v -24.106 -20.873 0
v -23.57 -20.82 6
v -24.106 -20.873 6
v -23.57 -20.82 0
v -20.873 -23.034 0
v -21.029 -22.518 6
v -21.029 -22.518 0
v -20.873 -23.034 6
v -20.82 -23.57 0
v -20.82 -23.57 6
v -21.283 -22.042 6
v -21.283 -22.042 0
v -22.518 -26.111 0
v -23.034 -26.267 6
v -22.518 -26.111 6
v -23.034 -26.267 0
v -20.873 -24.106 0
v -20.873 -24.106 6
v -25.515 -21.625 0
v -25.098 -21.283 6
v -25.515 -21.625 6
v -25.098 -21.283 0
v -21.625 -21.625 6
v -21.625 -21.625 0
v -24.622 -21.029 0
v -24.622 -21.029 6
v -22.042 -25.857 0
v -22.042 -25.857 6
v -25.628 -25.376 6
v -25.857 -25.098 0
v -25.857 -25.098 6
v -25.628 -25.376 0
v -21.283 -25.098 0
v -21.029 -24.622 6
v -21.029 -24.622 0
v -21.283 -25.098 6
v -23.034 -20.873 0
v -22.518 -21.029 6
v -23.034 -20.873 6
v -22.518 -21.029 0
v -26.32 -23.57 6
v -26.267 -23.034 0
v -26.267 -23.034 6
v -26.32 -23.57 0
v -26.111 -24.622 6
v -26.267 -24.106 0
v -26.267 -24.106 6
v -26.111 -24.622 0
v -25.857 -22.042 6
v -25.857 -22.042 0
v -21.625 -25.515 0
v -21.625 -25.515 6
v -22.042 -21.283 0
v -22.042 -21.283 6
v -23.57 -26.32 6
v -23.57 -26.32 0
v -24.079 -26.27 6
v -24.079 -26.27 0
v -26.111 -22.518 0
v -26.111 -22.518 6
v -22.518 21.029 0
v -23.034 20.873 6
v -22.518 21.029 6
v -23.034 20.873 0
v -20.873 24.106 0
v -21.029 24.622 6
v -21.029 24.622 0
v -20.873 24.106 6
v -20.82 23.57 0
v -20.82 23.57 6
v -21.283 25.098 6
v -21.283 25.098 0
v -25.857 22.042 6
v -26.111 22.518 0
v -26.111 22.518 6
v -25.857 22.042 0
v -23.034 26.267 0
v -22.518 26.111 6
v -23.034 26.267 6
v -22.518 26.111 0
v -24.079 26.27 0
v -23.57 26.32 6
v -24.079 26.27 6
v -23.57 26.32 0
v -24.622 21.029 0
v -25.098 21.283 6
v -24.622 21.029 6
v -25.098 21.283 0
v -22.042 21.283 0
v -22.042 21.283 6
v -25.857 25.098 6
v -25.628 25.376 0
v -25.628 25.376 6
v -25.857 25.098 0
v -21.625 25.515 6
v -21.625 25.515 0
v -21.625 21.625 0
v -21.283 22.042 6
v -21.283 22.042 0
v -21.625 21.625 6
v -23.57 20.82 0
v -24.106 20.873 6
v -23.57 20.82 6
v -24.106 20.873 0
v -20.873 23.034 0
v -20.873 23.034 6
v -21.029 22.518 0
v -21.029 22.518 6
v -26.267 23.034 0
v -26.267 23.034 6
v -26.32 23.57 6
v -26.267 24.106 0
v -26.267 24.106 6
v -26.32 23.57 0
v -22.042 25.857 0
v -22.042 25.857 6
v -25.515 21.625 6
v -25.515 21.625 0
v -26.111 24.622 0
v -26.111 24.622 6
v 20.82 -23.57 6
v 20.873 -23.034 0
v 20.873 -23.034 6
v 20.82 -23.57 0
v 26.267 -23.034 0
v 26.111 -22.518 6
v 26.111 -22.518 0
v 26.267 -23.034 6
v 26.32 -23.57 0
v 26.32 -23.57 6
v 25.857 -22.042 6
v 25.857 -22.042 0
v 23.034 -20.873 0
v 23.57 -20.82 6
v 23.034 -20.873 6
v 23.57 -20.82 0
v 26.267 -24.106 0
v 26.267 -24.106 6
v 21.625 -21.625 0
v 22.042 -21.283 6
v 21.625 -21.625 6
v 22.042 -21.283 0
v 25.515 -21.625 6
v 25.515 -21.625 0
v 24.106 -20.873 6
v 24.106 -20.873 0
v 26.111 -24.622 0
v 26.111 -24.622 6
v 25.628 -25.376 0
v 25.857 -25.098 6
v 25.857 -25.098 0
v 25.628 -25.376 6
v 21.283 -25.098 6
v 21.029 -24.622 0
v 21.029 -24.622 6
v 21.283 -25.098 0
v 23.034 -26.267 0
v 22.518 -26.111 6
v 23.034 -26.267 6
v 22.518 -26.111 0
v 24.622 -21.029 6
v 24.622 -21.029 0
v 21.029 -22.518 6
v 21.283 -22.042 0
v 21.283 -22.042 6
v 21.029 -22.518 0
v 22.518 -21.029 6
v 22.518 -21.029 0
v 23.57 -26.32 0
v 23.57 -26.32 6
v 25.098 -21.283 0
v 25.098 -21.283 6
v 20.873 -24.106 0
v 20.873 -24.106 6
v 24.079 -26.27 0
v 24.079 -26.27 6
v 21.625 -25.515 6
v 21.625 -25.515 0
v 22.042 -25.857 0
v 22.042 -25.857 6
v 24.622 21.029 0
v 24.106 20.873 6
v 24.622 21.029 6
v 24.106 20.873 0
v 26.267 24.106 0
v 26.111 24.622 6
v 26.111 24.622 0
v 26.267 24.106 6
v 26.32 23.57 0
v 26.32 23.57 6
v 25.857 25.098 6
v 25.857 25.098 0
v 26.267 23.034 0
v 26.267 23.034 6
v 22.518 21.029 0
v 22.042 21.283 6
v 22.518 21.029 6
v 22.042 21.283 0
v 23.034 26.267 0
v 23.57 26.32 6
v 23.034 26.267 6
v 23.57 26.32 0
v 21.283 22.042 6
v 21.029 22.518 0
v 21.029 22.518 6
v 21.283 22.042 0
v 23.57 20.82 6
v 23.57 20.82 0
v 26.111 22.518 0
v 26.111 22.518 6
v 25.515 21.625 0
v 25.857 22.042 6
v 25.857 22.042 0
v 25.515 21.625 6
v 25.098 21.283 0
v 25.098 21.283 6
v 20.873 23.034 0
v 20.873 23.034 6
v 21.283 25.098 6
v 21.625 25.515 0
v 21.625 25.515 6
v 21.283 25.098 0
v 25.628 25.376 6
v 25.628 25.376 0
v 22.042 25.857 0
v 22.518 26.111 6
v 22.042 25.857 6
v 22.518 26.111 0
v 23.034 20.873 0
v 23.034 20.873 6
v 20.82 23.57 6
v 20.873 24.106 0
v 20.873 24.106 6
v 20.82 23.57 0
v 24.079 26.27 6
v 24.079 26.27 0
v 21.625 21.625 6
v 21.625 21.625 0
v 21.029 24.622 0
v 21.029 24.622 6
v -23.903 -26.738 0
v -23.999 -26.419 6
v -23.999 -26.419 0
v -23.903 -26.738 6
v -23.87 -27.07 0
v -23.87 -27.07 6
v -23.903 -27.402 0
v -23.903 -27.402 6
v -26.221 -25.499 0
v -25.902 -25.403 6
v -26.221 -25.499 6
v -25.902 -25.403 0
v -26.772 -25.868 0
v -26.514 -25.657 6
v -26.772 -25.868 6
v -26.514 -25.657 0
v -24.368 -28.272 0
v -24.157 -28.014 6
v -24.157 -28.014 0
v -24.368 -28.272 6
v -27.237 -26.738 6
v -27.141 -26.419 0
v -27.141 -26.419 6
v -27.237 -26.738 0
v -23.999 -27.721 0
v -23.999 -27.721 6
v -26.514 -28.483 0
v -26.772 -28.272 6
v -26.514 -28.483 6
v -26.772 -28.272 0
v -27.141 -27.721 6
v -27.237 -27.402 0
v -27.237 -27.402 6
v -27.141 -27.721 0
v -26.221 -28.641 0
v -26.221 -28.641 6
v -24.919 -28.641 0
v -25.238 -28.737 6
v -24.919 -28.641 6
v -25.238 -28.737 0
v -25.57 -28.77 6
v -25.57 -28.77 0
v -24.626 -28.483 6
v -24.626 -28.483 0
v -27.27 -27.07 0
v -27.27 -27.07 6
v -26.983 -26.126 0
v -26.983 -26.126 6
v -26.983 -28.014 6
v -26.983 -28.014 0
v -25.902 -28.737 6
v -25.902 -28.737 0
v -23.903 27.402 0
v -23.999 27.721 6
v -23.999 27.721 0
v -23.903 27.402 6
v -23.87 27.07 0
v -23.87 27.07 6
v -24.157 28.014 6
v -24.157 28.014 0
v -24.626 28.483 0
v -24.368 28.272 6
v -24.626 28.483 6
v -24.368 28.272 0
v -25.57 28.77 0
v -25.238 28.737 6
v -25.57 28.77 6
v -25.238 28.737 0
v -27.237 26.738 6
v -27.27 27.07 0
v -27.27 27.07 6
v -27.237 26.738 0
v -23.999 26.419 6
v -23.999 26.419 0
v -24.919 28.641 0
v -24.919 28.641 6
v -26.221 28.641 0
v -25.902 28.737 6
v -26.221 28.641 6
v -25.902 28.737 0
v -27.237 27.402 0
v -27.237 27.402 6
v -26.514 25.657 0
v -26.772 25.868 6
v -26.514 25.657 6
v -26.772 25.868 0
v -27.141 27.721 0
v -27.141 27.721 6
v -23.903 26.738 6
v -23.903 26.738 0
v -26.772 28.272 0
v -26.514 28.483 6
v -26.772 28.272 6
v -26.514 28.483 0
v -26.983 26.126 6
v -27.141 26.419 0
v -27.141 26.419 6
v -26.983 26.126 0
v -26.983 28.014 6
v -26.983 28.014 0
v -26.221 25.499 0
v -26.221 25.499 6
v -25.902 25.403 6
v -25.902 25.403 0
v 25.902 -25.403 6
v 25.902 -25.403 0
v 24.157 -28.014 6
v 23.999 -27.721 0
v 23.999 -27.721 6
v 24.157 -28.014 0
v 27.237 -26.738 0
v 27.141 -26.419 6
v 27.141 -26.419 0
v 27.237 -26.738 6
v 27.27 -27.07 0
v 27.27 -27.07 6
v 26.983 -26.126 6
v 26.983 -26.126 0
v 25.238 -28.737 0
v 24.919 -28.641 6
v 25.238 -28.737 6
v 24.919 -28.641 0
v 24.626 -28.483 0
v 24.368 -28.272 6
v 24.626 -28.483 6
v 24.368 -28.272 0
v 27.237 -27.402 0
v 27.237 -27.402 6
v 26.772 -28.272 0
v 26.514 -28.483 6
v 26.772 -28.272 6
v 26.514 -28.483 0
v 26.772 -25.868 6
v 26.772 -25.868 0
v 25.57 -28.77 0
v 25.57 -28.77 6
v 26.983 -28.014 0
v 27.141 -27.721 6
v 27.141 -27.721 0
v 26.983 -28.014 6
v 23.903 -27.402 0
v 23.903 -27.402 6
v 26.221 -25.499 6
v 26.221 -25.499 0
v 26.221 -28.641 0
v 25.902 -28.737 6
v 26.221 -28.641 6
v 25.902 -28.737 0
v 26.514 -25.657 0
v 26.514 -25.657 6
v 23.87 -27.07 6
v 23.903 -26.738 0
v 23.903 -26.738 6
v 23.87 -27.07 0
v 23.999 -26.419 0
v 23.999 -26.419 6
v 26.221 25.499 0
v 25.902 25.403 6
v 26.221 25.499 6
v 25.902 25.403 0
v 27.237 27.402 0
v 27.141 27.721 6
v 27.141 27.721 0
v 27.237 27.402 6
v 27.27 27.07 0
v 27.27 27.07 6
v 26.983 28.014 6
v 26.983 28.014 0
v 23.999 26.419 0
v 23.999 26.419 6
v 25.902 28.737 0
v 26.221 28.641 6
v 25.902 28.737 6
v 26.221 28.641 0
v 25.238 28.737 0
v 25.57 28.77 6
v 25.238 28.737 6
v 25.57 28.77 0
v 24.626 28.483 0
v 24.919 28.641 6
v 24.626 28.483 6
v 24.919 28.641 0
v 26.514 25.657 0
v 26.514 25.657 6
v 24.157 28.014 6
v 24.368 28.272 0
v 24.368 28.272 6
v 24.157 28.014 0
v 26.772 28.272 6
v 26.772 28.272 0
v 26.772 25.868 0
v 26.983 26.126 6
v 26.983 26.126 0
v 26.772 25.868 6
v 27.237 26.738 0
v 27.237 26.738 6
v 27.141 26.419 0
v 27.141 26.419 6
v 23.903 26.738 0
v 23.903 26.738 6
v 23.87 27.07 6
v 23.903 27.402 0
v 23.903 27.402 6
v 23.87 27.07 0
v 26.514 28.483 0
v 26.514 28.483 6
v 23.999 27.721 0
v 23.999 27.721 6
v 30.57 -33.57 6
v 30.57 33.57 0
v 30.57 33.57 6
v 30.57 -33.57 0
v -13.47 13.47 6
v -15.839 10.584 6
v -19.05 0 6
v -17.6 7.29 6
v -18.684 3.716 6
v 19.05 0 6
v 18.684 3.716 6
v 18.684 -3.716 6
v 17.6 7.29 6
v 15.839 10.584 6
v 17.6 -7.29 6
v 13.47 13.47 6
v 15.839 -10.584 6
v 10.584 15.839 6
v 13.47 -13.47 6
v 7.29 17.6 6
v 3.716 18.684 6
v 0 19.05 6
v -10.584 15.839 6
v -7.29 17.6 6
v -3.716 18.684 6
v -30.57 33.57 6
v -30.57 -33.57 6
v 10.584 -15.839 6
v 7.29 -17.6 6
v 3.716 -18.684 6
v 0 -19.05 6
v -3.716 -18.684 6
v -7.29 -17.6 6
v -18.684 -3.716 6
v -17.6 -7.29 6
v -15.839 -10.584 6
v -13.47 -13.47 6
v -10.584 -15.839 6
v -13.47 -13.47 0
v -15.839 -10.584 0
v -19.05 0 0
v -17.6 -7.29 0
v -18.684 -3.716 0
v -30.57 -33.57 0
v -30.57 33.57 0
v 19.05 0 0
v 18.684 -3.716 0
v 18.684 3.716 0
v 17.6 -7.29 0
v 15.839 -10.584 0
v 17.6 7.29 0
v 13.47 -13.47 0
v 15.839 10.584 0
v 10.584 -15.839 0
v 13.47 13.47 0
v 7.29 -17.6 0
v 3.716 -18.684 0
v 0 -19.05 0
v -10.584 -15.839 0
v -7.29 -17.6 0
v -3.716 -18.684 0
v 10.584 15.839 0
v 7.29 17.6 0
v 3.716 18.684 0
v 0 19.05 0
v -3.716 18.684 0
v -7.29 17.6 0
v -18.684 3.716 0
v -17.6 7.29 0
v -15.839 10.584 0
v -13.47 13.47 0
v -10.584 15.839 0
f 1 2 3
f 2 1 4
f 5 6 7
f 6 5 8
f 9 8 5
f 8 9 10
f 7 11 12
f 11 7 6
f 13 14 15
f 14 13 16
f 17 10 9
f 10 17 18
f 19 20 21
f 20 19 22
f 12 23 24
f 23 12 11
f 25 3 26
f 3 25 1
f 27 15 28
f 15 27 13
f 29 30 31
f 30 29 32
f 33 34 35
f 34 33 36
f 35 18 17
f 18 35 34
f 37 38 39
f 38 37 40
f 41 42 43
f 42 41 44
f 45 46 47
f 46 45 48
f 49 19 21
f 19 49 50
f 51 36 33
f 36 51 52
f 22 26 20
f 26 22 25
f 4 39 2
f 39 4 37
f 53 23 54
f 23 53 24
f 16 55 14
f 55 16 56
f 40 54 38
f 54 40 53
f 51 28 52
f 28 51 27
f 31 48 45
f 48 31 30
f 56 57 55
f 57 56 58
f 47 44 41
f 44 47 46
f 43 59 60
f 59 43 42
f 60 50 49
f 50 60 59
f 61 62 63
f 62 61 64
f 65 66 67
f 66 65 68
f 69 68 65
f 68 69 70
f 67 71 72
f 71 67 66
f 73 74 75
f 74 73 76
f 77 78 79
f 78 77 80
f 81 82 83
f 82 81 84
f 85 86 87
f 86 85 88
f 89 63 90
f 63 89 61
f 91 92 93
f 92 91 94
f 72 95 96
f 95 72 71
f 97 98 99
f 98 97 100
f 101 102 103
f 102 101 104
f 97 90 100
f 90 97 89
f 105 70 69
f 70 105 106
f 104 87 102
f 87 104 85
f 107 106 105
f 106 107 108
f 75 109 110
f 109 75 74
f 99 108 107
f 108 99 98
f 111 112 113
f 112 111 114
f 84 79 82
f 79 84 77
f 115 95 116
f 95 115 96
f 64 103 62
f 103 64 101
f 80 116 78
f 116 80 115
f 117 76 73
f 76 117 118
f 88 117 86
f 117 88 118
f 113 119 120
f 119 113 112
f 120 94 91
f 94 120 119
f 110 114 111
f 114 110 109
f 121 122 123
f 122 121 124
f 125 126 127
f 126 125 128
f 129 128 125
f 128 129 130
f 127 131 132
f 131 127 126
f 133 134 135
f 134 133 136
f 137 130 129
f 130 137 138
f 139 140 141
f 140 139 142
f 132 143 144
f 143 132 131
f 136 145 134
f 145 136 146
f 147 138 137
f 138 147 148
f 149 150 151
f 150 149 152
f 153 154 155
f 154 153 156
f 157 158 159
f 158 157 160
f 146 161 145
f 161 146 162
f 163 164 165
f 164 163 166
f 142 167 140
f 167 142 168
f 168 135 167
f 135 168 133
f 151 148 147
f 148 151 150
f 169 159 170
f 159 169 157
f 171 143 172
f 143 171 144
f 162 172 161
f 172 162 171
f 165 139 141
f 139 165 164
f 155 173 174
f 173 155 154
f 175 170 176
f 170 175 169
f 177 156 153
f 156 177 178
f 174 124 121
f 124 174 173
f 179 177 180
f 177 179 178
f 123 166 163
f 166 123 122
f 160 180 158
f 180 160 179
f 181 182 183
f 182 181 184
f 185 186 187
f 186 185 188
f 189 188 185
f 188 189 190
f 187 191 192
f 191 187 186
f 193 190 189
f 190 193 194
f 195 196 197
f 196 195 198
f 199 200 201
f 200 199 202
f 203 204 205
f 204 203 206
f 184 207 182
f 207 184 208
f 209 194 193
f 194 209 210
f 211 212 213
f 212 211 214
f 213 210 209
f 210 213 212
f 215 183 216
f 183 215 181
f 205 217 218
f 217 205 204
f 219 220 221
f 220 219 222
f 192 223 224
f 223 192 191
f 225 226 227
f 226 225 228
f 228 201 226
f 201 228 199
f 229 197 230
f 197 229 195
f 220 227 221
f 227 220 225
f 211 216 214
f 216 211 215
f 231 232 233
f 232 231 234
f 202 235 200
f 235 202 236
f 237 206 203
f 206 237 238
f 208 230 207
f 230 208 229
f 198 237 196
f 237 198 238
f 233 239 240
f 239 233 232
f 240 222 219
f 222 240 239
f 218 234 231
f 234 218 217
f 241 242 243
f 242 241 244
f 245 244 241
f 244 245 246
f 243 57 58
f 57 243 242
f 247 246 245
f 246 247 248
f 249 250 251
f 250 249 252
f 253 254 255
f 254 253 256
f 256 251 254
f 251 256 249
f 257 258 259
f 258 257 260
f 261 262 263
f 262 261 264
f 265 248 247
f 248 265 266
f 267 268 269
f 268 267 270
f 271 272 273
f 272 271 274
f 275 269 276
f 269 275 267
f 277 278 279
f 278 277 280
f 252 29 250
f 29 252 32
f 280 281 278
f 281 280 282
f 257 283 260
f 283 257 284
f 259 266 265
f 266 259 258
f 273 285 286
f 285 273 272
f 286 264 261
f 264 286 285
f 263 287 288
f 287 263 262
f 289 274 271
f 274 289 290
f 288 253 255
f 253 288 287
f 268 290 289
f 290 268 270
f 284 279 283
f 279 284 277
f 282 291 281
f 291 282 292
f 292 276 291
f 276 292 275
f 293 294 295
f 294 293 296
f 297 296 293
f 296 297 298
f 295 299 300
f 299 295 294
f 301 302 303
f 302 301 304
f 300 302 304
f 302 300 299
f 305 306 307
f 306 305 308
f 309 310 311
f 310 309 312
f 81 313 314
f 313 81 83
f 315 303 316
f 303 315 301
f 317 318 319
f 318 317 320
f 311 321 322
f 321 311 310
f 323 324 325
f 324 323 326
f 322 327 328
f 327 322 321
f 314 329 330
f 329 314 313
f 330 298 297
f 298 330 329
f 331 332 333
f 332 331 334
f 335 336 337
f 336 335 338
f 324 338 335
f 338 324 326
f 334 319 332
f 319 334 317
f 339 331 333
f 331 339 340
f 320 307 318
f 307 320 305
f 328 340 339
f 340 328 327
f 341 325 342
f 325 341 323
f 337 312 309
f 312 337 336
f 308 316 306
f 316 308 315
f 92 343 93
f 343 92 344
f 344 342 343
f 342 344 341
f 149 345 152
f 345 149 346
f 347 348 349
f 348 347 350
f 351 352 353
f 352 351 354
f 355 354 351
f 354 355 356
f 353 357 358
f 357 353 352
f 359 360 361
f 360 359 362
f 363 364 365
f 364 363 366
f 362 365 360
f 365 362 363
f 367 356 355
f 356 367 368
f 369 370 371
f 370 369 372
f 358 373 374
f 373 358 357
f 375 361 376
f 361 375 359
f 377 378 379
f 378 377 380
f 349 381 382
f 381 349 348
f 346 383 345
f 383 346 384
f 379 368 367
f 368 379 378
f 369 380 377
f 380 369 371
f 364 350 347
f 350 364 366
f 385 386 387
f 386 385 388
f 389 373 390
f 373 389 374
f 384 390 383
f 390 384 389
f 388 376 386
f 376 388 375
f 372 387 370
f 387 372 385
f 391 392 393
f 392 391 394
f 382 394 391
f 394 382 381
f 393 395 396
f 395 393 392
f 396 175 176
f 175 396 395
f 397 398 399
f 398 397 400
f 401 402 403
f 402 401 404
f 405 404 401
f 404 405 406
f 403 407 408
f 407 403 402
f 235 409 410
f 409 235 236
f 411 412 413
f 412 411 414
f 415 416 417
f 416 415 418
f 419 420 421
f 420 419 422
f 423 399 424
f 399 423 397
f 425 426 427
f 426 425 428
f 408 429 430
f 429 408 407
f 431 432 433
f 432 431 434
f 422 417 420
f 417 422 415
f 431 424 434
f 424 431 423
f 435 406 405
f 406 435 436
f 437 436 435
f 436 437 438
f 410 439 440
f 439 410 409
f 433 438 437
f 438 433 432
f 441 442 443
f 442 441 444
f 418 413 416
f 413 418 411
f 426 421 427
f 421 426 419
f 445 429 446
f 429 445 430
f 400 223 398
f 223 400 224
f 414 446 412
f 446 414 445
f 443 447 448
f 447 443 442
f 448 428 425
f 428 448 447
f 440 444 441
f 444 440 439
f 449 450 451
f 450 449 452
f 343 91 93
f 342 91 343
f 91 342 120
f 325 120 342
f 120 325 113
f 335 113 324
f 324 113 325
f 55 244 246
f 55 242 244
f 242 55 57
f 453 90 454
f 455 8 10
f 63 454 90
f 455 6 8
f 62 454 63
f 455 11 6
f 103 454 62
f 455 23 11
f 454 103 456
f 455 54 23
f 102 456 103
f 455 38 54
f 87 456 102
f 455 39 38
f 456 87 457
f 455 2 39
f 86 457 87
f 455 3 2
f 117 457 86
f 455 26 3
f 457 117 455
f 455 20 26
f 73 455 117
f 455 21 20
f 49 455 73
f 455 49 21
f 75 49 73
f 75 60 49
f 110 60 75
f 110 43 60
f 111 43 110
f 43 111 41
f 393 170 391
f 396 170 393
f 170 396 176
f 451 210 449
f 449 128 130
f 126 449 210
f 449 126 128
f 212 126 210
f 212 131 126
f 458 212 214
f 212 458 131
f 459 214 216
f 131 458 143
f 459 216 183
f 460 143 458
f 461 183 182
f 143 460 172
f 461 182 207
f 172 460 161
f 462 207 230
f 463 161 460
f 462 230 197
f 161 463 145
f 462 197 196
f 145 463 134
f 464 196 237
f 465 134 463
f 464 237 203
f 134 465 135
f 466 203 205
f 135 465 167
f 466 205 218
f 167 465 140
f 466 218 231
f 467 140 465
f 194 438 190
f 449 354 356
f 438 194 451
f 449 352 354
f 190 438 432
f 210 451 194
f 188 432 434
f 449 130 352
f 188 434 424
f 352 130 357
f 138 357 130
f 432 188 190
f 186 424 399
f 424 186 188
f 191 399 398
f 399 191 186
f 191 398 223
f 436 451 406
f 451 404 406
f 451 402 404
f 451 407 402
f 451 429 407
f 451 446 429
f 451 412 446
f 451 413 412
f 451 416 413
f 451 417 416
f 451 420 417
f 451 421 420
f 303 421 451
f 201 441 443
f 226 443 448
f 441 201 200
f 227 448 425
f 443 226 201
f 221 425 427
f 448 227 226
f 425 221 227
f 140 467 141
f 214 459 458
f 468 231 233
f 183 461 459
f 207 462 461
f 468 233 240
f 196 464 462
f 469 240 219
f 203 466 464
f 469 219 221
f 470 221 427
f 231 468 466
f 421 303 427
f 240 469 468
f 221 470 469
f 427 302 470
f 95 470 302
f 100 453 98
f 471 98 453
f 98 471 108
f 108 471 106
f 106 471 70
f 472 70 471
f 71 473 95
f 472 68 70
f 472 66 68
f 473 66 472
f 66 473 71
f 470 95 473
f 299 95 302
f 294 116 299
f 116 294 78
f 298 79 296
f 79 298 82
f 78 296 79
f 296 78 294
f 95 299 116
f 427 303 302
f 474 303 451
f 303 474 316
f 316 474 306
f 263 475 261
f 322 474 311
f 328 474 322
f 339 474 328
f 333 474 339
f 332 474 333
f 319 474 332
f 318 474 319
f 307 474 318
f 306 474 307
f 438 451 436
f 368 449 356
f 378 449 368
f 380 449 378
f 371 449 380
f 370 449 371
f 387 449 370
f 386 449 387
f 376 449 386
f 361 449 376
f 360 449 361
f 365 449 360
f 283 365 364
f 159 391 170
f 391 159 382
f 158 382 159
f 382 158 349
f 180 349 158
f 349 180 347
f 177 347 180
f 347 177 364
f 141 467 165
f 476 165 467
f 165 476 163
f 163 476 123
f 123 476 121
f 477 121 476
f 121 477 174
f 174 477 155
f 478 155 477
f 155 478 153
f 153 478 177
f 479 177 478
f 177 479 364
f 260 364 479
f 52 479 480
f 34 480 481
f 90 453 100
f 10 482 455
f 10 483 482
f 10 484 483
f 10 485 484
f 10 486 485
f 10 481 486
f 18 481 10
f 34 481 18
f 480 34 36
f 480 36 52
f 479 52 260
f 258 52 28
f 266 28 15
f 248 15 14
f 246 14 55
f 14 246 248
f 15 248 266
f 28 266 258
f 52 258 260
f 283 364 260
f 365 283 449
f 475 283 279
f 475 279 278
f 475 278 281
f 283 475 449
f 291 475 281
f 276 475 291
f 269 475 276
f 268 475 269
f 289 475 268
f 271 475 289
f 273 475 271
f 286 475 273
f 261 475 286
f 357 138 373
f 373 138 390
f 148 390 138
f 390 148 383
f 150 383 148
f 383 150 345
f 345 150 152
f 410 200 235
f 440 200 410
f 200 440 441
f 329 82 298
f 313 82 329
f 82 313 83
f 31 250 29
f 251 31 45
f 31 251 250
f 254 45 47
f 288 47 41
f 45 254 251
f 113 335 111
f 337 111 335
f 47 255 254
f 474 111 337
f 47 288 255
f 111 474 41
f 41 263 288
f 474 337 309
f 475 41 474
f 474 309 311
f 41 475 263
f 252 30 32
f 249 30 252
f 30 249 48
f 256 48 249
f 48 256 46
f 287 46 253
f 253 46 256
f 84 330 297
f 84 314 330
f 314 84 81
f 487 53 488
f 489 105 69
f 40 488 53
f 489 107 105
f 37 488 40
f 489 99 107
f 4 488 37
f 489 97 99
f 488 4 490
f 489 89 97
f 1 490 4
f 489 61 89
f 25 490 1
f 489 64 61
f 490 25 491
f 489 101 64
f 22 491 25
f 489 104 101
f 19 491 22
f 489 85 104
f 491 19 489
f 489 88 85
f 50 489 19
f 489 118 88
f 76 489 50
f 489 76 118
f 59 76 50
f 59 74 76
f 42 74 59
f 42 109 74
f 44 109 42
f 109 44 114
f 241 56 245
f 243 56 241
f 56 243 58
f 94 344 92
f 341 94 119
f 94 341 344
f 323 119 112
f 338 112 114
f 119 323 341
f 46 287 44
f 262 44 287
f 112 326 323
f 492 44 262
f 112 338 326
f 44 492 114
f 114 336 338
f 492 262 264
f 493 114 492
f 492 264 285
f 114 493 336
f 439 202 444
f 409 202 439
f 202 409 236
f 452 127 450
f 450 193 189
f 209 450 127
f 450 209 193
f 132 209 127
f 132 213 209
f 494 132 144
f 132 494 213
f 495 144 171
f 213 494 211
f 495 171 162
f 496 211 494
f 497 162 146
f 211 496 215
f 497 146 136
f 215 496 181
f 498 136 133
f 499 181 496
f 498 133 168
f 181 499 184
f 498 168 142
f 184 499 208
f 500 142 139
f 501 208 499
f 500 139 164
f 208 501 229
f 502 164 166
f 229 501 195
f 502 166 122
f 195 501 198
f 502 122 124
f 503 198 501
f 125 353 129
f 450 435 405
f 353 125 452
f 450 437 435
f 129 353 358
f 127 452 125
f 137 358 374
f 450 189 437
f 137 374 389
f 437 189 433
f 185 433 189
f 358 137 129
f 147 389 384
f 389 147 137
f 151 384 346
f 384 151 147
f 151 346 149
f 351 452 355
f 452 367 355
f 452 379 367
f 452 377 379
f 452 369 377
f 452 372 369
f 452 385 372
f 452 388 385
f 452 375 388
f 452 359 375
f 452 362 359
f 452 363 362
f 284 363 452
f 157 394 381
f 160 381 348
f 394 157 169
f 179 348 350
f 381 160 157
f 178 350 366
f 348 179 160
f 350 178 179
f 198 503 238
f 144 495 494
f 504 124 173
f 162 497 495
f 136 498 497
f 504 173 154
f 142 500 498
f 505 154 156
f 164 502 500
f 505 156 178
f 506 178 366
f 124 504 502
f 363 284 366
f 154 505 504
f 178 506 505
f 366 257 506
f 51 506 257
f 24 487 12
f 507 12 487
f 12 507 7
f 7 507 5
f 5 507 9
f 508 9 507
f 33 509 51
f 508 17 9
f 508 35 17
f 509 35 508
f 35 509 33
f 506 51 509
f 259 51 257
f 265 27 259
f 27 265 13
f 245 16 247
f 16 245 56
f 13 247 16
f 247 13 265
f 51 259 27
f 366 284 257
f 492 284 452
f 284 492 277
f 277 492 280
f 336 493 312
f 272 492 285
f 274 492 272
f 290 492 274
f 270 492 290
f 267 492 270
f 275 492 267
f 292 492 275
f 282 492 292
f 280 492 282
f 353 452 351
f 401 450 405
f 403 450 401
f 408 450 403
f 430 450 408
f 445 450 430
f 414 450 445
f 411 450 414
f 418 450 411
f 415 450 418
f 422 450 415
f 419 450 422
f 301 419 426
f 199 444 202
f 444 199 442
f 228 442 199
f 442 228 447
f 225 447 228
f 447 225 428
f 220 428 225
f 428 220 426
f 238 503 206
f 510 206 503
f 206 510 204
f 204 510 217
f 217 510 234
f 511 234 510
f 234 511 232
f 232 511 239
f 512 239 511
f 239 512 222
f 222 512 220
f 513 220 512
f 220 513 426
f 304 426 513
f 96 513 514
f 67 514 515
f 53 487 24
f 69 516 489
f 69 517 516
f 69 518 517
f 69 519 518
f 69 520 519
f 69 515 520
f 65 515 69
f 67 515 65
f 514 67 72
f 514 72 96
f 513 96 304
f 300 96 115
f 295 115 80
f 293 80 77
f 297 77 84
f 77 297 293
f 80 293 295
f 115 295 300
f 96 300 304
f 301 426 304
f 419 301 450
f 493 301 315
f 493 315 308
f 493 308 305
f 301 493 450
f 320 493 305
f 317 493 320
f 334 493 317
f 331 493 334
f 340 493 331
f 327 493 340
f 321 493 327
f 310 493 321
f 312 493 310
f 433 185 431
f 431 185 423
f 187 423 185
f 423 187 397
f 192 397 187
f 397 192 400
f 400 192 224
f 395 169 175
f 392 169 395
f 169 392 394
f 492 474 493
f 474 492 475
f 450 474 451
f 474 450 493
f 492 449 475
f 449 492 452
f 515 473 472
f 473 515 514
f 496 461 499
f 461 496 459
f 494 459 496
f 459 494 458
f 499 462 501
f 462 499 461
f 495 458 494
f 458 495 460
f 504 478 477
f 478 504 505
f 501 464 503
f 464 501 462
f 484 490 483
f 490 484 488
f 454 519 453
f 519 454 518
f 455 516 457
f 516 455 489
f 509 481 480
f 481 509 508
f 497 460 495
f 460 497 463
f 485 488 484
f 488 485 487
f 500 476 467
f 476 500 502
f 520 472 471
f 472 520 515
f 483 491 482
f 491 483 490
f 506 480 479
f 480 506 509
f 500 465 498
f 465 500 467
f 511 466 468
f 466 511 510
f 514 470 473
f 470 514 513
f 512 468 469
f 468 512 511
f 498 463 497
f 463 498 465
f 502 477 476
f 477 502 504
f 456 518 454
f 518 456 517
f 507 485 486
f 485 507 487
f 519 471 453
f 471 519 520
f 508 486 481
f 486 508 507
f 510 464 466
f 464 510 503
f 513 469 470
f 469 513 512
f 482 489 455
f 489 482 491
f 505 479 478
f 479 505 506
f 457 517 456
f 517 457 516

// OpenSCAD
$fn = 32;

// ----------------------------------------------------------------------
// Motor mount plate: NEMA23, 61.14 x 67.14 x 6 mm
// ----------------------------------------------------------------------

// --- parameters (mm) ---
base_x = 61.14;           // plate length, X
base_y = 67.14;           // plate width, Y
thick = 6;                // plate thickness
bolt_pitch = 47.14;       // NEMA23 bolt spacing
motor_d = 5.5;            // NEMA23 screw clearance
boss_hole = 38.1;         // pilot boss bore
second_d = 3.4;           // second fastener hole

module plate() {
  translate([-base_x / 2, -base_y / 2, 0]) cube([base_x, base_y, thick]);
}

module motor_holes() {
  for (sx = [-1, 1]) for (sy = [-1, 1])
    translate([sx * bolt_pitch / 2, sy * bolt_pitch / 2, -1])
      cylinder(h = thick + 2, d = motor_d);
}

difference() {
  union() {
    plate();
  }
  motor_holes();
  translate([0, 0, -1]) cylinder(h = thick + 2, d = boss_hole);
  for (sx = [-1, 1]) for (sy = [-1, 1])
    translate([sx * 25.57, sy * 27.07, -1]) cylinder(h = thick + 2, d = second_d);
}
